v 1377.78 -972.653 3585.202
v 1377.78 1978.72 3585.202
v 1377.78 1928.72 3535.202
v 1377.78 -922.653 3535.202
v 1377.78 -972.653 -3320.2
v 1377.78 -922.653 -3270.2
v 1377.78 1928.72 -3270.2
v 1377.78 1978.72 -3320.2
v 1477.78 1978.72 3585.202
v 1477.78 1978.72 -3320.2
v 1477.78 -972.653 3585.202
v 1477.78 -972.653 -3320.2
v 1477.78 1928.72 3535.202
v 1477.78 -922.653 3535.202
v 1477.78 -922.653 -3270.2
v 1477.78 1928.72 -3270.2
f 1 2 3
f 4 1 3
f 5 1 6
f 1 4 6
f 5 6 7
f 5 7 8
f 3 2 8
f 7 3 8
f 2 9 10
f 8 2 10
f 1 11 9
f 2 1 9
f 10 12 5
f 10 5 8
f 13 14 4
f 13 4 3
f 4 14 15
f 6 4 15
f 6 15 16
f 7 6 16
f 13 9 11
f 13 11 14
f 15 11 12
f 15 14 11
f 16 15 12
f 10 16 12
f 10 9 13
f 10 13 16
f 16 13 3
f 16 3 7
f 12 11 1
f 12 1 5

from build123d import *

# Parameters (mm, degrees)
SKETCH1_W           = 6905.40199
SKETCH1_H           = 2951.372621228
SKETCH1_W_2         = 6805.40199
SKETCH1_H_2         = 2851.372621228
BOSS_EXTRUDE1_DEPTH = 100


with BuildPart() as part:
    # Sketch1 → Boss-Extrude1 (new body)
    with BuildSketch(Plane(origin=(1477.78, 0, 0), x_dir=(0, 0, -1), z_dir=(1, 0, 0))):
        with Locations((-132.500995, 503.033219386)):
            Rectangle(SKETCH1_W, SKETCH1_H)
        with Locations((-132.500995, 503.033219386)):
            Rectangle(SKETCH1_W_2, SKETCH1_H_2, mode=Mode.SUBTRACT)
    extrude(amount=-BOSS_EXTRUDE1_DEPTH)


solid = part.part
